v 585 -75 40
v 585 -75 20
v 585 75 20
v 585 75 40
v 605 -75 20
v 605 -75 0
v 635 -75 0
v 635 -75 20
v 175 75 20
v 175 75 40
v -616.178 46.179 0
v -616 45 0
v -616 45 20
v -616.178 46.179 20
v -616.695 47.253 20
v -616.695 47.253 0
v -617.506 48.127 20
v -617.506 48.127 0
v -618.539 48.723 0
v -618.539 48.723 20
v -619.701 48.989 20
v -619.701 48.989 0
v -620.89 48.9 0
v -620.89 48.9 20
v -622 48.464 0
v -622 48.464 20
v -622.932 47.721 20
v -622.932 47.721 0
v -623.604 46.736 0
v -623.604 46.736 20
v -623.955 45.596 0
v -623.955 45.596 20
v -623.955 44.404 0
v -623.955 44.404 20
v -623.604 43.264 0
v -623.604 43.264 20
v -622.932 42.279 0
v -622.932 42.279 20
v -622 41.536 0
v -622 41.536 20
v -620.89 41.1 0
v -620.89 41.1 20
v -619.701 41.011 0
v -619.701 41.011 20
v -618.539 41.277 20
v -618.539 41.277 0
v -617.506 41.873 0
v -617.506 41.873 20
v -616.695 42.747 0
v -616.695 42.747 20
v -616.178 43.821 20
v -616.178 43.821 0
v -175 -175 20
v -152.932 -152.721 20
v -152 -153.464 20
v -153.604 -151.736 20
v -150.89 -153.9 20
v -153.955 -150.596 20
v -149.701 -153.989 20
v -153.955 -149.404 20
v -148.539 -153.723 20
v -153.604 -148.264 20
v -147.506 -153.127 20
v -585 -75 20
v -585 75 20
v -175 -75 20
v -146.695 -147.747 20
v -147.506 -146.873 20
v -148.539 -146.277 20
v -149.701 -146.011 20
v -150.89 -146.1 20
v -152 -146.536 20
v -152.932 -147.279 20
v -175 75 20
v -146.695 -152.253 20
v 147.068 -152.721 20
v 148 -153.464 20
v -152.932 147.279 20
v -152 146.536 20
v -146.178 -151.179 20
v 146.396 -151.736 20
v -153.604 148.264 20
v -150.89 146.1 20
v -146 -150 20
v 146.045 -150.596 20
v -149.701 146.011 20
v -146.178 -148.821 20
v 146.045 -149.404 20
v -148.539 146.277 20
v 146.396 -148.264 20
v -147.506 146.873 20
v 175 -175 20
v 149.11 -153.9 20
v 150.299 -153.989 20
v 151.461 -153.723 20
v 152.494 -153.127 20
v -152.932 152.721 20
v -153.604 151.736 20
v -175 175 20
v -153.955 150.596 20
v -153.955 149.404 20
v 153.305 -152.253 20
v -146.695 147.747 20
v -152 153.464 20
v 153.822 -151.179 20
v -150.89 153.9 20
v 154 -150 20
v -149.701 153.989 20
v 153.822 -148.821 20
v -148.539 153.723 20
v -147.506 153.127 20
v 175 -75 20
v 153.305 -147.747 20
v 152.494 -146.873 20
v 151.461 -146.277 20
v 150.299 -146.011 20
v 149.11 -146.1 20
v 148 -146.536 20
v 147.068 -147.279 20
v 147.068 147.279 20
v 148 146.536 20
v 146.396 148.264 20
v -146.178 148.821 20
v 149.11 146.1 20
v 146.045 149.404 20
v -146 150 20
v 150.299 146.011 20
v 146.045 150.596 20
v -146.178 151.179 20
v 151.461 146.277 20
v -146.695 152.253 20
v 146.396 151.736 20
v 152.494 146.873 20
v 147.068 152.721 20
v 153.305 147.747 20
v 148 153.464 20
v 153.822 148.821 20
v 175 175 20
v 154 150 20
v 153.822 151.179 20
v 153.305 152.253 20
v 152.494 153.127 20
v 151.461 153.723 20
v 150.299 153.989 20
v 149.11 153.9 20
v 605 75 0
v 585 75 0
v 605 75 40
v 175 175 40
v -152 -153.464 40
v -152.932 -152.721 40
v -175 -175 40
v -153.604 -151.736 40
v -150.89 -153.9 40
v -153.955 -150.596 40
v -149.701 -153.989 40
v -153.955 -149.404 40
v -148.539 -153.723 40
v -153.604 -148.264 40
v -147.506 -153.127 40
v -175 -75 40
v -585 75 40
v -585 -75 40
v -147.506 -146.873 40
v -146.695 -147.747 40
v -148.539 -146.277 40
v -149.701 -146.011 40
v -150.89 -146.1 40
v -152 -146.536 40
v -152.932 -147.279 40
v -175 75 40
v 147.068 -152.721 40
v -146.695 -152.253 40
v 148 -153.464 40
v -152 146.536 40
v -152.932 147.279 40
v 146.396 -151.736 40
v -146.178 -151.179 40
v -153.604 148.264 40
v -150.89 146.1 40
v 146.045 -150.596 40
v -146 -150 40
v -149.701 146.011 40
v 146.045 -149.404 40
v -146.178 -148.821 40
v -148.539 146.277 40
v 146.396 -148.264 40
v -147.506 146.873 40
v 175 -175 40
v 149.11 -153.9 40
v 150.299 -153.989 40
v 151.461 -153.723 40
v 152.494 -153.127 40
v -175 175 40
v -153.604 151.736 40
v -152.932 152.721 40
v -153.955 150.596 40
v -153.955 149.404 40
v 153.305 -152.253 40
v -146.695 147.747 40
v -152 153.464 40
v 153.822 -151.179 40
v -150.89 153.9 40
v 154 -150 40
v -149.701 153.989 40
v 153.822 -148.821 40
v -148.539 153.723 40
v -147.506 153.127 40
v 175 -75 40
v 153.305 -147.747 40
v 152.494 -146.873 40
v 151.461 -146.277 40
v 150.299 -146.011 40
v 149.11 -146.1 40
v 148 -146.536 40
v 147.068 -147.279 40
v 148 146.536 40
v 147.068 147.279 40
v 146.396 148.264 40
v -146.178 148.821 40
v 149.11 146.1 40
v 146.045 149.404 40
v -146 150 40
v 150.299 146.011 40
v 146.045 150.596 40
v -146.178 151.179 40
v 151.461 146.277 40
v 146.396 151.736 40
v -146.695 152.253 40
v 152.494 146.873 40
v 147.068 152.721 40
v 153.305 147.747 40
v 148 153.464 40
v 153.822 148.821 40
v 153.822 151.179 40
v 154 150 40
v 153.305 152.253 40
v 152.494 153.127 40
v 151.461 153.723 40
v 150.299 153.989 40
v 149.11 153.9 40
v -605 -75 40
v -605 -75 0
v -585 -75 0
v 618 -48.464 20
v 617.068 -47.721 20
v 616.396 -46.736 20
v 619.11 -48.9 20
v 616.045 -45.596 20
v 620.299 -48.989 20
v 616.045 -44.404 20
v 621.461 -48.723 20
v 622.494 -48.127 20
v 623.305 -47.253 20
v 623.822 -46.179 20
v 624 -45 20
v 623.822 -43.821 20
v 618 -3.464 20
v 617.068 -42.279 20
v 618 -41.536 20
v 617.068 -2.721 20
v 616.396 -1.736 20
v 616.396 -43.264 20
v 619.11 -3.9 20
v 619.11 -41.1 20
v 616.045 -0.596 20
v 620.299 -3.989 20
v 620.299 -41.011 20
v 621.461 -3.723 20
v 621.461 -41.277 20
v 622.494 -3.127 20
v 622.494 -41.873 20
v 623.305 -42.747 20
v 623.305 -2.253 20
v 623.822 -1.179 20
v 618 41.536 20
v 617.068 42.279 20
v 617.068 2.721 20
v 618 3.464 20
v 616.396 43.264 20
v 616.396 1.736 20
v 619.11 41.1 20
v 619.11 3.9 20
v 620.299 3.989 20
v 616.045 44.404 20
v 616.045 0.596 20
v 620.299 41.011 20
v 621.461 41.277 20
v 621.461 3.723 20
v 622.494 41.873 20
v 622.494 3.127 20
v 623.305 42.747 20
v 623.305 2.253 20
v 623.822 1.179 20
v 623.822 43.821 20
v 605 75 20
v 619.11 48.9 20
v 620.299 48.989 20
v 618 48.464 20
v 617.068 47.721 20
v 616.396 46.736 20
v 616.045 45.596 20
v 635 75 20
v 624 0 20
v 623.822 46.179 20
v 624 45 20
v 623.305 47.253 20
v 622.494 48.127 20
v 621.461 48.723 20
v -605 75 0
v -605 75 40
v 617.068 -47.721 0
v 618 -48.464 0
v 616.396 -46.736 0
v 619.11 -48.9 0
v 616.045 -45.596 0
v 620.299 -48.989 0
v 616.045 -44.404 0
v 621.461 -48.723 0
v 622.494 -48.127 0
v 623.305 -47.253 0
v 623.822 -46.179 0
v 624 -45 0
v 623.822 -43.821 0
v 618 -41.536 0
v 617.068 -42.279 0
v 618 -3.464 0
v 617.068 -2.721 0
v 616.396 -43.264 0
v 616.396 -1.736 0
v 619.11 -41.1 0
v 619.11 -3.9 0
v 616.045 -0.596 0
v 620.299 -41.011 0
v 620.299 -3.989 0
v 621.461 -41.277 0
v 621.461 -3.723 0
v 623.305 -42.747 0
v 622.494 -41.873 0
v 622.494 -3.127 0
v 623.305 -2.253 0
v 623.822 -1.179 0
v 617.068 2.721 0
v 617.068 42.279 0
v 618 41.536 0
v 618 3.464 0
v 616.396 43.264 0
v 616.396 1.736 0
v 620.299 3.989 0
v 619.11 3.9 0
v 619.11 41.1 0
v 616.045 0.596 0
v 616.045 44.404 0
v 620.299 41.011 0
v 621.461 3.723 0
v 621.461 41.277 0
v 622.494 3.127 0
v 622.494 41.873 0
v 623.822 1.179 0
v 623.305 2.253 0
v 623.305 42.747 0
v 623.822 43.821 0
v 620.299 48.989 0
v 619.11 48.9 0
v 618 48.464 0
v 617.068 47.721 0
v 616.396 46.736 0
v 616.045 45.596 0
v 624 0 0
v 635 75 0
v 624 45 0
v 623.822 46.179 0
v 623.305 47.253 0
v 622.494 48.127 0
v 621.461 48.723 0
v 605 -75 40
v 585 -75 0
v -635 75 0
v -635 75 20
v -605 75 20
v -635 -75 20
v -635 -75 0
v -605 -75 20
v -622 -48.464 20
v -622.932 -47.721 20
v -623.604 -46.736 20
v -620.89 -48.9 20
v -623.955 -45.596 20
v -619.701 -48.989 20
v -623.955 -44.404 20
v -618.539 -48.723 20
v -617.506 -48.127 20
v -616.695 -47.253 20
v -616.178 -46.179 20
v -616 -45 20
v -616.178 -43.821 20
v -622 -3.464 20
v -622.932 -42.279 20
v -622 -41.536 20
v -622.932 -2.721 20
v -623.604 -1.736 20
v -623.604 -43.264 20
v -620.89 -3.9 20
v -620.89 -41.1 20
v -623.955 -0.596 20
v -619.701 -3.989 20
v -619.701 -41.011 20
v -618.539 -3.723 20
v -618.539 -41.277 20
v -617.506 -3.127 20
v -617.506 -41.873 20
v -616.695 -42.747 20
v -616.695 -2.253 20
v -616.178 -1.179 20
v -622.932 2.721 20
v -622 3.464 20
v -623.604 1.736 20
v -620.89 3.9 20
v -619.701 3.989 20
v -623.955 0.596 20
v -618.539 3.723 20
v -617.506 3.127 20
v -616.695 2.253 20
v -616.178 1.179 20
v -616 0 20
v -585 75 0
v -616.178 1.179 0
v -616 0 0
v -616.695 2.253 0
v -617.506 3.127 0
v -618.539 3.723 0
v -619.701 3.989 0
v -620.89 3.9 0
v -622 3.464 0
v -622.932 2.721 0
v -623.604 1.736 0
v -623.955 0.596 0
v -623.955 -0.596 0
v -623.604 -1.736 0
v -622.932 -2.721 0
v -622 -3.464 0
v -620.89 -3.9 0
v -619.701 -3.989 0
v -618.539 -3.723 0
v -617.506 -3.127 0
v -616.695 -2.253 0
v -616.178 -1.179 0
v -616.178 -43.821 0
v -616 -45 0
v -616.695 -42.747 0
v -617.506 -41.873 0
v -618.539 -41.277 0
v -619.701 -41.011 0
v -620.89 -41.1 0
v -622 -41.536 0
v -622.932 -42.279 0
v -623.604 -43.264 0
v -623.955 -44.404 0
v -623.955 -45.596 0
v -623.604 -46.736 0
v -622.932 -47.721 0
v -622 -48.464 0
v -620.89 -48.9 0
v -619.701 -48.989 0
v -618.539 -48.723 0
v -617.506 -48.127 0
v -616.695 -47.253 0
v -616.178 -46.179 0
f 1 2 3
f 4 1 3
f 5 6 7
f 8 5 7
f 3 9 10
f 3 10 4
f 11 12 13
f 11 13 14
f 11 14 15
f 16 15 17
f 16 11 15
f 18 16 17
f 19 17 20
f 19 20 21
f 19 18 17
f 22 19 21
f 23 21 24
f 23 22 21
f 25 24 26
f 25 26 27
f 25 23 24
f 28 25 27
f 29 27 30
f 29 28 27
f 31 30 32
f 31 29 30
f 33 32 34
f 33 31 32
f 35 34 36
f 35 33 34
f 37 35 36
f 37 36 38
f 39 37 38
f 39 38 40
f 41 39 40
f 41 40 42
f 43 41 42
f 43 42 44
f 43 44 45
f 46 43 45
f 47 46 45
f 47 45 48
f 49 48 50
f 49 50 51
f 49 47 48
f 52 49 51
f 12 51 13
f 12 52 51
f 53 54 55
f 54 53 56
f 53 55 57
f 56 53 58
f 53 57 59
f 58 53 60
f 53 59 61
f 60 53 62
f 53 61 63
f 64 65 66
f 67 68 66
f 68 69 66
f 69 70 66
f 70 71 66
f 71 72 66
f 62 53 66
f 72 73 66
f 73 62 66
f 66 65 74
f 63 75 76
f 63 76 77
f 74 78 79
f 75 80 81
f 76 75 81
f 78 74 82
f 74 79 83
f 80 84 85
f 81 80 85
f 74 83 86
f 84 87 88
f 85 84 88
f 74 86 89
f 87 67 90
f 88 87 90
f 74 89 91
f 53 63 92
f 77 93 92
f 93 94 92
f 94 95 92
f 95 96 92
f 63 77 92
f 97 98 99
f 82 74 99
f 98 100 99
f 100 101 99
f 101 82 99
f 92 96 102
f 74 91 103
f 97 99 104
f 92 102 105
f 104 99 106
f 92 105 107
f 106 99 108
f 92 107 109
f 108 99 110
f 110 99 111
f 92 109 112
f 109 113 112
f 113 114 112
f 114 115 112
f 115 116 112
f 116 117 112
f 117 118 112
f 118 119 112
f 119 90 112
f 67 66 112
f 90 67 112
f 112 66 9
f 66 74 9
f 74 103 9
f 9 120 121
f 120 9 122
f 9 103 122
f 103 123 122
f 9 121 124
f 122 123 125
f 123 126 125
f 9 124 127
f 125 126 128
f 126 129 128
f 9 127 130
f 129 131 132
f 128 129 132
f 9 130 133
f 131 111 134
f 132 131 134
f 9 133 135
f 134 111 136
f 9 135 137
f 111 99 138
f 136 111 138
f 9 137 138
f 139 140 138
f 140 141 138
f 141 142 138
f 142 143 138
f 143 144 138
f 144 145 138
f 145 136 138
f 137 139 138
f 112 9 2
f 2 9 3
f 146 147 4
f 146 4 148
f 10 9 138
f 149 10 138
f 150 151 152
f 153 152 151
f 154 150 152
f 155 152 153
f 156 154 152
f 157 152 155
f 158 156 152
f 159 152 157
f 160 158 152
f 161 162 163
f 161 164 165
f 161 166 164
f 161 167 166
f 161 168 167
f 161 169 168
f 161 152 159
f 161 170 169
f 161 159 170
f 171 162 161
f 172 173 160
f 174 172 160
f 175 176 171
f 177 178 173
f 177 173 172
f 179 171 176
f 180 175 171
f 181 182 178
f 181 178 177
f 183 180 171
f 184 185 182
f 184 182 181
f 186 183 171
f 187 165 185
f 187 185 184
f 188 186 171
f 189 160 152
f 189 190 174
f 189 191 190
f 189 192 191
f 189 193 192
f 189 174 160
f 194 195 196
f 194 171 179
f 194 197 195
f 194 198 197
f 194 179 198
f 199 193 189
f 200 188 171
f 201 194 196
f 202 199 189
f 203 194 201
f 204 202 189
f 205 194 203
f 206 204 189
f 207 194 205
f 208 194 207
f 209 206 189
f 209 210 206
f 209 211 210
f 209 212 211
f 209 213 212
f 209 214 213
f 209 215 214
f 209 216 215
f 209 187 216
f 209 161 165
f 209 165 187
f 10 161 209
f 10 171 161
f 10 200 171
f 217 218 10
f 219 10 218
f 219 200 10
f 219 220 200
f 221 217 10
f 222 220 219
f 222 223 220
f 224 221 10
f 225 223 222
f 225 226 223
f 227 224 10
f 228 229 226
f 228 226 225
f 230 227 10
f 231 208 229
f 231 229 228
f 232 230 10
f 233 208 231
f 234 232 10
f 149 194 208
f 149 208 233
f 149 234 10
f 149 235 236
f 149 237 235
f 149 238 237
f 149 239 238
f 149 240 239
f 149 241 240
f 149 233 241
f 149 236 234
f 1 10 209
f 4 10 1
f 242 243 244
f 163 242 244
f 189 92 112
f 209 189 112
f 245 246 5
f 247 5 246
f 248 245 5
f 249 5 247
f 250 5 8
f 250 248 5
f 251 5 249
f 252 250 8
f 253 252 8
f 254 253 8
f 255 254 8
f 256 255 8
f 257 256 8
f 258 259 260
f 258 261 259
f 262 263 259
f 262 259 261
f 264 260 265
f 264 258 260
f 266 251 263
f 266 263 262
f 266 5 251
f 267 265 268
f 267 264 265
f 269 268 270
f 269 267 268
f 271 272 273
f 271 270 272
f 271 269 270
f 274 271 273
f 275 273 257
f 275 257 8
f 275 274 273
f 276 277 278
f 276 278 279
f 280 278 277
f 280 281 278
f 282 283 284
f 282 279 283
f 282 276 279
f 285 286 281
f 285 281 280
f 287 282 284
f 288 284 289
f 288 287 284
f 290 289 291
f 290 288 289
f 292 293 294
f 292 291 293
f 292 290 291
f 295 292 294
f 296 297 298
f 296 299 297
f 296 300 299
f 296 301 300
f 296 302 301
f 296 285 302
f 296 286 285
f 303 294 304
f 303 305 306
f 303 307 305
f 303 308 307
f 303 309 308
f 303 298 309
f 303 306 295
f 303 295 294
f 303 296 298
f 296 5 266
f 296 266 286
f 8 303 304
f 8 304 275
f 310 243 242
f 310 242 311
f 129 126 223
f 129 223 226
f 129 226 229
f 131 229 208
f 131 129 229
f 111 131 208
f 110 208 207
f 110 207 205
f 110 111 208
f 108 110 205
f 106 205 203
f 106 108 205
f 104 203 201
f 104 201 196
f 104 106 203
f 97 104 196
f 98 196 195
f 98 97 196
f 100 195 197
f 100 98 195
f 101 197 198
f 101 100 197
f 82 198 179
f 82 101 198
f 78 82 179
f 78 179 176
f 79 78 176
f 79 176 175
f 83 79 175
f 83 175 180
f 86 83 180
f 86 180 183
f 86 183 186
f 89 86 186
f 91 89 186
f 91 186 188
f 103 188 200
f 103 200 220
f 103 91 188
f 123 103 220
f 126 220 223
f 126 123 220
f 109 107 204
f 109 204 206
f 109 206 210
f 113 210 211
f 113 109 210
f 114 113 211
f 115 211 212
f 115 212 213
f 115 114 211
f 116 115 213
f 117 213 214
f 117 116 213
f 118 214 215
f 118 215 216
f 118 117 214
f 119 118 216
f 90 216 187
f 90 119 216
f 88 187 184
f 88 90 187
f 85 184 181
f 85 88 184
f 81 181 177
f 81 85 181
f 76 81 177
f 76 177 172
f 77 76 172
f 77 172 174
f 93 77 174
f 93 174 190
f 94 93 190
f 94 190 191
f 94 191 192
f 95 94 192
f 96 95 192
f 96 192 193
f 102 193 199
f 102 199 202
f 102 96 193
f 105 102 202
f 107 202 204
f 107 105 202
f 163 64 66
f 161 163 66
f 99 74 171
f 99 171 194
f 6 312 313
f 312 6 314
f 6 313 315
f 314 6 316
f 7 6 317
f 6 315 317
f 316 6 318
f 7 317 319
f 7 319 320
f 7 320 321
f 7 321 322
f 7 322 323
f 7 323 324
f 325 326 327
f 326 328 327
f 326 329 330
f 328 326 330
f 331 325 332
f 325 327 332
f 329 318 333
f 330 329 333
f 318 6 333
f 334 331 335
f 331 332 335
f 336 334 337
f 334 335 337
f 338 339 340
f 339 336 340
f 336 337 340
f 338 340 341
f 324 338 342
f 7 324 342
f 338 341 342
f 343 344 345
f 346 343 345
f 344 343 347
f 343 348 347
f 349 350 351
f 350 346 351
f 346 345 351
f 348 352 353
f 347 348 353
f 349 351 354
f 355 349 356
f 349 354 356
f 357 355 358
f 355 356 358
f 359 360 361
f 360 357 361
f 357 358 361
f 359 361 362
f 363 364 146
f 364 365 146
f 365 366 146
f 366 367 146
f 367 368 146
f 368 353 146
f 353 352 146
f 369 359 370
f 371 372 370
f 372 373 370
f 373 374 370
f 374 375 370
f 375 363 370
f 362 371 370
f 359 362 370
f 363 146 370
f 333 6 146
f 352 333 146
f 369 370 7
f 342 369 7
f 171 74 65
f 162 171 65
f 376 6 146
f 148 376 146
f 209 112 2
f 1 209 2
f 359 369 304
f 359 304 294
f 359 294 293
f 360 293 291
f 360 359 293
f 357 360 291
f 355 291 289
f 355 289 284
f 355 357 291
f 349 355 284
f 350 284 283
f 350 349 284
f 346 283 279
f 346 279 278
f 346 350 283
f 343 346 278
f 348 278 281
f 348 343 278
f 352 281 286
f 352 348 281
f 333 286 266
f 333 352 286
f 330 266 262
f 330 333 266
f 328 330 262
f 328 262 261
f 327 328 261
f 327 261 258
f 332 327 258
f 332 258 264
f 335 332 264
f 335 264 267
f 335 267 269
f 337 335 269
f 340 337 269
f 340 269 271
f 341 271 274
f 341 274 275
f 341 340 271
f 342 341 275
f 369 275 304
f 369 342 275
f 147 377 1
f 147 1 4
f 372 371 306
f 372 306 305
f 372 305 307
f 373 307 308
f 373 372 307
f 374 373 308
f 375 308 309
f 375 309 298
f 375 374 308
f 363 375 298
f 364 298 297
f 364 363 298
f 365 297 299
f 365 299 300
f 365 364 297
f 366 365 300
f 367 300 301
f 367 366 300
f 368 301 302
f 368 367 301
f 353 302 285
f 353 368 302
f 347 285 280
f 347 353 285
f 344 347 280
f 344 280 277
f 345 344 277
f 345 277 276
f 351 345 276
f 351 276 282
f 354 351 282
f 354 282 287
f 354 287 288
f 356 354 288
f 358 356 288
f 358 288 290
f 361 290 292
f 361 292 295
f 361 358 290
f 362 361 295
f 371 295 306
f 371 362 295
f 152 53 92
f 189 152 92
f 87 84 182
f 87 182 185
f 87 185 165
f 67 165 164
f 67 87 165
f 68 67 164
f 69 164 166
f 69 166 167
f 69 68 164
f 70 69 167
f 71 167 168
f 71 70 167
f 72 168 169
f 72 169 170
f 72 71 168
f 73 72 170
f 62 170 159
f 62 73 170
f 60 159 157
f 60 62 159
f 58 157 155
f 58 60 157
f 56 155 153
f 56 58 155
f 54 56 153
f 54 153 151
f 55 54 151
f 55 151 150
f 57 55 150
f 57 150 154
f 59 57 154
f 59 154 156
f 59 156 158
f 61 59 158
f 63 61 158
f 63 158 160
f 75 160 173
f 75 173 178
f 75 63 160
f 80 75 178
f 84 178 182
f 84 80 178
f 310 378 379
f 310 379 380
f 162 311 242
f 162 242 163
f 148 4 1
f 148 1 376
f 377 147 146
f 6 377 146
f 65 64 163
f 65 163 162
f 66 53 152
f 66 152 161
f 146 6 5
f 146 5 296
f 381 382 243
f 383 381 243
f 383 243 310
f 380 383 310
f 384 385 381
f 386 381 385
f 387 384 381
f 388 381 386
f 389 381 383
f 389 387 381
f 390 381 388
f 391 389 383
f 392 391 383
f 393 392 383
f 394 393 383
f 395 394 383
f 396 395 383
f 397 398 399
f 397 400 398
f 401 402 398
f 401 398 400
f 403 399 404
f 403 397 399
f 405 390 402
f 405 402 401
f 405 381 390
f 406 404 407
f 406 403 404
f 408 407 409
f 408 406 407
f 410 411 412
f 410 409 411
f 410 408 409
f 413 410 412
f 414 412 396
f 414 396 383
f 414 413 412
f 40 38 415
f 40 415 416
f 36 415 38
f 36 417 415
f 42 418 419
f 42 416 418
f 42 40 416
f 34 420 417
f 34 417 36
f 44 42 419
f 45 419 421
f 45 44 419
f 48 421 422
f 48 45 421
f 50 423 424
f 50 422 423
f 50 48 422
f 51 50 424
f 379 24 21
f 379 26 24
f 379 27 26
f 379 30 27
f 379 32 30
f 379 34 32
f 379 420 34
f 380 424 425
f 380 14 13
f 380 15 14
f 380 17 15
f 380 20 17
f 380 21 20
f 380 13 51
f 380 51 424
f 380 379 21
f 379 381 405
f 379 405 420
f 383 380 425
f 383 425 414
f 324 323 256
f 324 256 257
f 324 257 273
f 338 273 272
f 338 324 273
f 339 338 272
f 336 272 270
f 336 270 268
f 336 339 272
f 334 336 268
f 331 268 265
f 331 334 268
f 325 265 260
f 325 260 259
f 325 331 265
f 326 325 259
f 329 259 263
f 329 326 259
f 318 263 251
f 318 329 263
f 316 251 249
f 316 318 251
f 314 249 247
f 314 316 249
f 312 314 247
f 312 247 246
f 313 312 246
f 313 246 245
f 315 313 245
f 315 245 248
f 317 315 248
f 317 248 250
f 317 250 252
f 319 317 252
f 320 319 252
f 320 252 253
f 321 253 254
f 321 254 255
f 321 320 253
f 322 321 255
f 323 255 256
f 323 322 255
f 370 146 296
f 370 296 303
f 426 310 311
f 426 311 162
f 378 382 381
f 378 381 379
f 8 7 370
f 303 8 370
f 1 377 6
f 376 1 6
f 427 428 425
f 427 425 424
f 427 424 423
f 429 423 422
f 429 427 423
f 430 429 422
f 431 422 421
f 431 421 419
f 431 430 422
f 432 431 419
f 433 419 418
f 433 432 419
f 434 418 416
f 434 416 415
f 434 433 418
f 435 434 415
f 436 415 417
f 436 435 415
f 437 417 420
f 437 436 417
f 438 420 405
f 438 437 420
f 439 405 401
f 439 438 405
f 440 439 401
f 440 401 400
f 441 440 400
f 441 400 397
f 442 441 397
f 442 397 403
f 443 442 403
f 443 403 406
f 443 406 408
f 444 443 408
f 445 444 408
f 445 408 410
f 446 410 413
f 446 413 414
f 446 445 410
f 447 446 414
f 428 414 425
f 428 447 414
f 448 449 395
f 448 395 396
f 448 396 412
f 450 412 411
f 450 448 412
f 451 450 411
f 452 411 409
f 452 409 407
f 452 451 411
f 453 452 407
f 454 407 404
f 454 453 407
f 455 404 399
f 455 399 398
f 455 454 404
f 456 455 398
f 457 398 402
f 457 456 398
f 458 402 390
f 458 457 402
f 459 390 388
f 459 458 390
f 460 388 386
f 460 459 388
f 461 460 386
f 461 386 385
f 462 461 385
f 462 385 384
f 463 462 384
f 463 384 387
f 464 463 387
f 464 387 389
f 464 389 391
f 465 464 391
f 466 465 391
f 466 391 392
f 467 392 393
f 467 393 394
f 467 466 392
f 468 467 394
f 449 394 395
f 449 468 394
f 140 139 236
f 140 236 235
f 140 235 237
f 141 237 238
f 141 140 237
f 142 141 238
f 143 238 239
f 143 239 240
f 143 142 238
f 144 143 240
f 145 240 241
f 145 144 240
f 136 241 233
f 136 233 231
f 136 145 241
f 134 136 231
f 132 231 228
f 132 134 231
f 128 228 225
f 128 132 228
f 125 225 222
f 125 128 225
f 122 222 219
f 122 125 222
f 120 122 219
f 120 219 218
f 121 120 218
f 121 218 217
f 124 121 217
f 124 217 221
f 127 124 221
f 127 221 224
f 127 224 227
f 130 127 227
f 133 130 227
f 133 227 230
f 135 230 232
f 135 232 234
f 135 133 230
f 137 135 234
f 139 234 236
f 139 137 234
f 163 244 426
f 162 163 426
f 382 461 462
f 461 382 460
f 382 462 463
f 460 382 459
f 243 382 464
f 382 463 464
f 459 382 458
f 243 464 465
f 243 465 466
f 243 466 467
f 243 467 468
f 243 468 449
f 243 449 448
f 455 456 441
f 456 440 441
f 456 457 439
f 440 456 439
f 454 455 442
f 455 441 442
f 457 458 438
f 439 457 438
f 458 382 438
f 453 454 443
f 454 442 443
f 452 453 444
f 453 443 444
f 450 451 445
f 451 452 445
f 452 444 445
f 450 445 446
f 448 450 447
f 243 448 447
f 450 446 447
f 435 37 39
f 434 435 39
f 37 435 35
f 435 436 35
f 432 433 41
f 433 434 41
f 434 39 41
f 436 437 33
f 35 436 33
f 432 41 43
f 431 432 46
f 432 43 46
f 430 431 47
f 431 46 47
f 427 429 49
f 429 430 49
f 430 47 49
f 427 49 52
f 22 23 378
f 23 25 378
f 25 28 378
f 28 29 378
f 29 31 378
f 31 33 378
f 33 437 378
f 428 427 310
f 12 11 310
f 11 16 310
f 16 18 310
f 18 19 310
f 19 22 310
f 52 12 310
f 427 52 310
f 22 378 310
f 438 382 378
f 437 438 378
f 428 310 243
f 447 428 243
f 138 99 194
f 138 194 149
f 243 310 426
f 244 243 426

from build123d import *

# Parameters (mm, degrees)
F0_W     = 30
F0_H     = 150
F0_R     = 4
F1_DEPTH = 20
F0_W_2   = 20
F2_DEPTH = 40
F3_START = 20
F0_W_3   = 410
F0_W_4   = 350
F0_H_2   = 100
F3_DEPTH = 20


with BuildPart() as f1:
    # F0 (on Top) → F1 (new body)
    with BuildSketch(Plane.XY):
        with Locations((-620, 0)):
            Rectangle(F0_W, F0_H)
        with Locations((-620, -45)):
            Circle(F0_R, mode=Mode.SUBTRACT)
        with Locations((-620, 0)):
            Circle(F0_R, mode=Mode.SUBTRACT)
        with Locations((-620, 45)):
            Circle(F0_R, mode=Mode.SUBTRACT)
    extrude(amount=F1_DEPTH)


with BuildPart() as f1b:
    # F0 (on Top) → F1, piece 2 (new body)
    with BuildSketch(Plane.XY):
        with Locations((620, 0)):
            Rectangle(F0_W, F0_H)
        with Locations((620, -45)):
            Circle(F0_R, mode=Mode.SUBTRACT)
        with Locations((620, 0)):
            Circle(F0_R, mode=Mode.SUBTRACT)
        with Locations((620, 45)):
            Circle(F0_R, mode=Mode.SUBTRACT)
    extrude(amount=F1_DEPTH)


with BuildPart() as f2:
    # F0 (on Top) → F2 (new body)
    with BuildSketch(Plane.XY):
        with Locations((-595, 0)):
            Rectangle(F0_W_2, F0_H)
    extrude(amount=F2_DEPTH)


with BuildPart() as f2b:
    # F0 (on Top) → F2, piece 2 (new body)
    with BuildSketch(Plane.XY):
        with Locations((595, 0)):
            Rectangle(F0_W_2, F0_H)
    extrude(amount=F2_DEPTH)


with BuildPart() as f3:
    # F0 (on Top) → F3 (new body)
    with BuildSketch(Plane.XY.offset(F3_START)):
        with Locations((-380, 0)):
            Rectangle(F0_W_3, F0_H)
        Rectangle(F0_W_4, F0_H)
        with Locations((0, 125)):
            Rectangle(F0_W_4, F0_H_2)
        with Locations((-150, 150)):
            Circle(F0_R, mode=Mode.SUBTRACT)
        with Locations((150, 150)):
            Circle(F0_R, mode=Mode.SUBTRACT)
        with Locations((0, -125)):
            Rectangle(F0_W_4, F0_H_2)
        with Locations((-150, -150)):
            Circle(F0_R, mode=Mode.SUBTRACT)
        with Locations((150, -150)):
            Circle(F0_R, mode=Mode.SUBTRACT)
        with Locations((380, 0)):
            Rectangle(F0_W_3, F0_H)
    extrude(amount=F3_DEPTH)


solid = Compound([f1.part, f1b.part, f2.part, f2b.part, f3.part])
